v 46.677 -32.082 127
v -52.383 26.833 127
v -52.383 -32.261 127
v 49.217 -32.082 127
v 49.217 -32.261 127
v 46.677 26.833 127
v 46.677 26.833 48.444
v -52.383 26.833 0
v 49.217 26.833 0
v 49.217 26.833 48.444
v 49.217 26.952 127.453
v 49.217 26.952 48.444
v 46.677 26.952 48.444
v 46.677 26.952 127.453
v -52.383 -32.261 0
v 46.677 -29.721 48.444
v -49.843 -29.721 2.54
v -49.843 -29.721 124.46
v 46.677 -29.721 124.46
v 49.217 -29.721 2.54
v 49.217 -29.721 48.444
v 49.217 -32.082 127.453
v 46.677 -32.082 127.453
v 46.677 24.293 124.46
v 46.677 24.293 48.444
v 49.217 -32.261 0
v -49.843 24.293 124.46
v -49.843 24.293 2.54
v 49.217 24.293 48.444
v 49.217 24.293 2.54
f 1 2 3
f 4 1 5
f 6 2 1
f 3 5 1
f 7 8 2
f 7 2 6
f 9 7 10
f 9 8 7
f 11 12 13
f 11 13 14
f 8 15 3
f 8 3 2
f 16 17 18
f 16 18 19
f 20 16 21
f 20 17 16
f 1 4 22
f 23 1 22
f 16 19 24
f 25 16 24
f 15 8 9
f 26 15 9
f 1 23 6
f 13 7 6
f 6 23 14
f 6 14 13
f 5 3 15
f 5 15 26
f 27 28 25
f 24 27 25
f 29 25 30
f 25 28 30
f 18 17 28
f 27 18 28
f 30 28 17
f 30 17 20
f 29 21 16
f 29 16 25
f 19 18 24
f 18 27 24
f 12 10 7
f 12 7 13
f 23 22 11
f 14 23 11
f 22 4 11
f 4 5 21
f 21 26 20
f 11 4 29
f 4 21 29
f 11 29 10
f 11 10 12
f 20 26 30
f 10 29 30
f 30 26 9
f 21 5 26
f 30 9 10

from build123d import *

# Parameters (mm, degrees)
F0_W     = 101.6
F0_H     = 59.0938783061
F1_DEPTH = 127
F2_T     = -2.54
F4_W     = 59.033177793
F4_H     = 79.0090560913
F5_DEPTH = 2.54


with BuildPart() as f1:
    # F0 (on Top) → F1 (new body)
    with BuildSketch(Plane.XY):
        with Locations((-1.5831552446, -2.7139894664)):
            Rectangle(F0_W, F0_H)
    extrude(amount=F1_DEPTH)

    # F2
    f2_openings = [f1.faces().sort_by_distance(p)[0] for p in [
        (49.216845, -2.713989, 63.5),
    ]]
    offset(amount=F2_T, openings=f2_openings)

    # F4 (on offset) → F5 (join)
    with BuildSketch(Plane.YZ.offset(49.2168447554)):
        with Locations((-2.5649182498, 87.9480838776)):
            Rectangle(F4_W, F4_H)
    extrude(amount=-F5_DEPTH)


solid = f1.part
